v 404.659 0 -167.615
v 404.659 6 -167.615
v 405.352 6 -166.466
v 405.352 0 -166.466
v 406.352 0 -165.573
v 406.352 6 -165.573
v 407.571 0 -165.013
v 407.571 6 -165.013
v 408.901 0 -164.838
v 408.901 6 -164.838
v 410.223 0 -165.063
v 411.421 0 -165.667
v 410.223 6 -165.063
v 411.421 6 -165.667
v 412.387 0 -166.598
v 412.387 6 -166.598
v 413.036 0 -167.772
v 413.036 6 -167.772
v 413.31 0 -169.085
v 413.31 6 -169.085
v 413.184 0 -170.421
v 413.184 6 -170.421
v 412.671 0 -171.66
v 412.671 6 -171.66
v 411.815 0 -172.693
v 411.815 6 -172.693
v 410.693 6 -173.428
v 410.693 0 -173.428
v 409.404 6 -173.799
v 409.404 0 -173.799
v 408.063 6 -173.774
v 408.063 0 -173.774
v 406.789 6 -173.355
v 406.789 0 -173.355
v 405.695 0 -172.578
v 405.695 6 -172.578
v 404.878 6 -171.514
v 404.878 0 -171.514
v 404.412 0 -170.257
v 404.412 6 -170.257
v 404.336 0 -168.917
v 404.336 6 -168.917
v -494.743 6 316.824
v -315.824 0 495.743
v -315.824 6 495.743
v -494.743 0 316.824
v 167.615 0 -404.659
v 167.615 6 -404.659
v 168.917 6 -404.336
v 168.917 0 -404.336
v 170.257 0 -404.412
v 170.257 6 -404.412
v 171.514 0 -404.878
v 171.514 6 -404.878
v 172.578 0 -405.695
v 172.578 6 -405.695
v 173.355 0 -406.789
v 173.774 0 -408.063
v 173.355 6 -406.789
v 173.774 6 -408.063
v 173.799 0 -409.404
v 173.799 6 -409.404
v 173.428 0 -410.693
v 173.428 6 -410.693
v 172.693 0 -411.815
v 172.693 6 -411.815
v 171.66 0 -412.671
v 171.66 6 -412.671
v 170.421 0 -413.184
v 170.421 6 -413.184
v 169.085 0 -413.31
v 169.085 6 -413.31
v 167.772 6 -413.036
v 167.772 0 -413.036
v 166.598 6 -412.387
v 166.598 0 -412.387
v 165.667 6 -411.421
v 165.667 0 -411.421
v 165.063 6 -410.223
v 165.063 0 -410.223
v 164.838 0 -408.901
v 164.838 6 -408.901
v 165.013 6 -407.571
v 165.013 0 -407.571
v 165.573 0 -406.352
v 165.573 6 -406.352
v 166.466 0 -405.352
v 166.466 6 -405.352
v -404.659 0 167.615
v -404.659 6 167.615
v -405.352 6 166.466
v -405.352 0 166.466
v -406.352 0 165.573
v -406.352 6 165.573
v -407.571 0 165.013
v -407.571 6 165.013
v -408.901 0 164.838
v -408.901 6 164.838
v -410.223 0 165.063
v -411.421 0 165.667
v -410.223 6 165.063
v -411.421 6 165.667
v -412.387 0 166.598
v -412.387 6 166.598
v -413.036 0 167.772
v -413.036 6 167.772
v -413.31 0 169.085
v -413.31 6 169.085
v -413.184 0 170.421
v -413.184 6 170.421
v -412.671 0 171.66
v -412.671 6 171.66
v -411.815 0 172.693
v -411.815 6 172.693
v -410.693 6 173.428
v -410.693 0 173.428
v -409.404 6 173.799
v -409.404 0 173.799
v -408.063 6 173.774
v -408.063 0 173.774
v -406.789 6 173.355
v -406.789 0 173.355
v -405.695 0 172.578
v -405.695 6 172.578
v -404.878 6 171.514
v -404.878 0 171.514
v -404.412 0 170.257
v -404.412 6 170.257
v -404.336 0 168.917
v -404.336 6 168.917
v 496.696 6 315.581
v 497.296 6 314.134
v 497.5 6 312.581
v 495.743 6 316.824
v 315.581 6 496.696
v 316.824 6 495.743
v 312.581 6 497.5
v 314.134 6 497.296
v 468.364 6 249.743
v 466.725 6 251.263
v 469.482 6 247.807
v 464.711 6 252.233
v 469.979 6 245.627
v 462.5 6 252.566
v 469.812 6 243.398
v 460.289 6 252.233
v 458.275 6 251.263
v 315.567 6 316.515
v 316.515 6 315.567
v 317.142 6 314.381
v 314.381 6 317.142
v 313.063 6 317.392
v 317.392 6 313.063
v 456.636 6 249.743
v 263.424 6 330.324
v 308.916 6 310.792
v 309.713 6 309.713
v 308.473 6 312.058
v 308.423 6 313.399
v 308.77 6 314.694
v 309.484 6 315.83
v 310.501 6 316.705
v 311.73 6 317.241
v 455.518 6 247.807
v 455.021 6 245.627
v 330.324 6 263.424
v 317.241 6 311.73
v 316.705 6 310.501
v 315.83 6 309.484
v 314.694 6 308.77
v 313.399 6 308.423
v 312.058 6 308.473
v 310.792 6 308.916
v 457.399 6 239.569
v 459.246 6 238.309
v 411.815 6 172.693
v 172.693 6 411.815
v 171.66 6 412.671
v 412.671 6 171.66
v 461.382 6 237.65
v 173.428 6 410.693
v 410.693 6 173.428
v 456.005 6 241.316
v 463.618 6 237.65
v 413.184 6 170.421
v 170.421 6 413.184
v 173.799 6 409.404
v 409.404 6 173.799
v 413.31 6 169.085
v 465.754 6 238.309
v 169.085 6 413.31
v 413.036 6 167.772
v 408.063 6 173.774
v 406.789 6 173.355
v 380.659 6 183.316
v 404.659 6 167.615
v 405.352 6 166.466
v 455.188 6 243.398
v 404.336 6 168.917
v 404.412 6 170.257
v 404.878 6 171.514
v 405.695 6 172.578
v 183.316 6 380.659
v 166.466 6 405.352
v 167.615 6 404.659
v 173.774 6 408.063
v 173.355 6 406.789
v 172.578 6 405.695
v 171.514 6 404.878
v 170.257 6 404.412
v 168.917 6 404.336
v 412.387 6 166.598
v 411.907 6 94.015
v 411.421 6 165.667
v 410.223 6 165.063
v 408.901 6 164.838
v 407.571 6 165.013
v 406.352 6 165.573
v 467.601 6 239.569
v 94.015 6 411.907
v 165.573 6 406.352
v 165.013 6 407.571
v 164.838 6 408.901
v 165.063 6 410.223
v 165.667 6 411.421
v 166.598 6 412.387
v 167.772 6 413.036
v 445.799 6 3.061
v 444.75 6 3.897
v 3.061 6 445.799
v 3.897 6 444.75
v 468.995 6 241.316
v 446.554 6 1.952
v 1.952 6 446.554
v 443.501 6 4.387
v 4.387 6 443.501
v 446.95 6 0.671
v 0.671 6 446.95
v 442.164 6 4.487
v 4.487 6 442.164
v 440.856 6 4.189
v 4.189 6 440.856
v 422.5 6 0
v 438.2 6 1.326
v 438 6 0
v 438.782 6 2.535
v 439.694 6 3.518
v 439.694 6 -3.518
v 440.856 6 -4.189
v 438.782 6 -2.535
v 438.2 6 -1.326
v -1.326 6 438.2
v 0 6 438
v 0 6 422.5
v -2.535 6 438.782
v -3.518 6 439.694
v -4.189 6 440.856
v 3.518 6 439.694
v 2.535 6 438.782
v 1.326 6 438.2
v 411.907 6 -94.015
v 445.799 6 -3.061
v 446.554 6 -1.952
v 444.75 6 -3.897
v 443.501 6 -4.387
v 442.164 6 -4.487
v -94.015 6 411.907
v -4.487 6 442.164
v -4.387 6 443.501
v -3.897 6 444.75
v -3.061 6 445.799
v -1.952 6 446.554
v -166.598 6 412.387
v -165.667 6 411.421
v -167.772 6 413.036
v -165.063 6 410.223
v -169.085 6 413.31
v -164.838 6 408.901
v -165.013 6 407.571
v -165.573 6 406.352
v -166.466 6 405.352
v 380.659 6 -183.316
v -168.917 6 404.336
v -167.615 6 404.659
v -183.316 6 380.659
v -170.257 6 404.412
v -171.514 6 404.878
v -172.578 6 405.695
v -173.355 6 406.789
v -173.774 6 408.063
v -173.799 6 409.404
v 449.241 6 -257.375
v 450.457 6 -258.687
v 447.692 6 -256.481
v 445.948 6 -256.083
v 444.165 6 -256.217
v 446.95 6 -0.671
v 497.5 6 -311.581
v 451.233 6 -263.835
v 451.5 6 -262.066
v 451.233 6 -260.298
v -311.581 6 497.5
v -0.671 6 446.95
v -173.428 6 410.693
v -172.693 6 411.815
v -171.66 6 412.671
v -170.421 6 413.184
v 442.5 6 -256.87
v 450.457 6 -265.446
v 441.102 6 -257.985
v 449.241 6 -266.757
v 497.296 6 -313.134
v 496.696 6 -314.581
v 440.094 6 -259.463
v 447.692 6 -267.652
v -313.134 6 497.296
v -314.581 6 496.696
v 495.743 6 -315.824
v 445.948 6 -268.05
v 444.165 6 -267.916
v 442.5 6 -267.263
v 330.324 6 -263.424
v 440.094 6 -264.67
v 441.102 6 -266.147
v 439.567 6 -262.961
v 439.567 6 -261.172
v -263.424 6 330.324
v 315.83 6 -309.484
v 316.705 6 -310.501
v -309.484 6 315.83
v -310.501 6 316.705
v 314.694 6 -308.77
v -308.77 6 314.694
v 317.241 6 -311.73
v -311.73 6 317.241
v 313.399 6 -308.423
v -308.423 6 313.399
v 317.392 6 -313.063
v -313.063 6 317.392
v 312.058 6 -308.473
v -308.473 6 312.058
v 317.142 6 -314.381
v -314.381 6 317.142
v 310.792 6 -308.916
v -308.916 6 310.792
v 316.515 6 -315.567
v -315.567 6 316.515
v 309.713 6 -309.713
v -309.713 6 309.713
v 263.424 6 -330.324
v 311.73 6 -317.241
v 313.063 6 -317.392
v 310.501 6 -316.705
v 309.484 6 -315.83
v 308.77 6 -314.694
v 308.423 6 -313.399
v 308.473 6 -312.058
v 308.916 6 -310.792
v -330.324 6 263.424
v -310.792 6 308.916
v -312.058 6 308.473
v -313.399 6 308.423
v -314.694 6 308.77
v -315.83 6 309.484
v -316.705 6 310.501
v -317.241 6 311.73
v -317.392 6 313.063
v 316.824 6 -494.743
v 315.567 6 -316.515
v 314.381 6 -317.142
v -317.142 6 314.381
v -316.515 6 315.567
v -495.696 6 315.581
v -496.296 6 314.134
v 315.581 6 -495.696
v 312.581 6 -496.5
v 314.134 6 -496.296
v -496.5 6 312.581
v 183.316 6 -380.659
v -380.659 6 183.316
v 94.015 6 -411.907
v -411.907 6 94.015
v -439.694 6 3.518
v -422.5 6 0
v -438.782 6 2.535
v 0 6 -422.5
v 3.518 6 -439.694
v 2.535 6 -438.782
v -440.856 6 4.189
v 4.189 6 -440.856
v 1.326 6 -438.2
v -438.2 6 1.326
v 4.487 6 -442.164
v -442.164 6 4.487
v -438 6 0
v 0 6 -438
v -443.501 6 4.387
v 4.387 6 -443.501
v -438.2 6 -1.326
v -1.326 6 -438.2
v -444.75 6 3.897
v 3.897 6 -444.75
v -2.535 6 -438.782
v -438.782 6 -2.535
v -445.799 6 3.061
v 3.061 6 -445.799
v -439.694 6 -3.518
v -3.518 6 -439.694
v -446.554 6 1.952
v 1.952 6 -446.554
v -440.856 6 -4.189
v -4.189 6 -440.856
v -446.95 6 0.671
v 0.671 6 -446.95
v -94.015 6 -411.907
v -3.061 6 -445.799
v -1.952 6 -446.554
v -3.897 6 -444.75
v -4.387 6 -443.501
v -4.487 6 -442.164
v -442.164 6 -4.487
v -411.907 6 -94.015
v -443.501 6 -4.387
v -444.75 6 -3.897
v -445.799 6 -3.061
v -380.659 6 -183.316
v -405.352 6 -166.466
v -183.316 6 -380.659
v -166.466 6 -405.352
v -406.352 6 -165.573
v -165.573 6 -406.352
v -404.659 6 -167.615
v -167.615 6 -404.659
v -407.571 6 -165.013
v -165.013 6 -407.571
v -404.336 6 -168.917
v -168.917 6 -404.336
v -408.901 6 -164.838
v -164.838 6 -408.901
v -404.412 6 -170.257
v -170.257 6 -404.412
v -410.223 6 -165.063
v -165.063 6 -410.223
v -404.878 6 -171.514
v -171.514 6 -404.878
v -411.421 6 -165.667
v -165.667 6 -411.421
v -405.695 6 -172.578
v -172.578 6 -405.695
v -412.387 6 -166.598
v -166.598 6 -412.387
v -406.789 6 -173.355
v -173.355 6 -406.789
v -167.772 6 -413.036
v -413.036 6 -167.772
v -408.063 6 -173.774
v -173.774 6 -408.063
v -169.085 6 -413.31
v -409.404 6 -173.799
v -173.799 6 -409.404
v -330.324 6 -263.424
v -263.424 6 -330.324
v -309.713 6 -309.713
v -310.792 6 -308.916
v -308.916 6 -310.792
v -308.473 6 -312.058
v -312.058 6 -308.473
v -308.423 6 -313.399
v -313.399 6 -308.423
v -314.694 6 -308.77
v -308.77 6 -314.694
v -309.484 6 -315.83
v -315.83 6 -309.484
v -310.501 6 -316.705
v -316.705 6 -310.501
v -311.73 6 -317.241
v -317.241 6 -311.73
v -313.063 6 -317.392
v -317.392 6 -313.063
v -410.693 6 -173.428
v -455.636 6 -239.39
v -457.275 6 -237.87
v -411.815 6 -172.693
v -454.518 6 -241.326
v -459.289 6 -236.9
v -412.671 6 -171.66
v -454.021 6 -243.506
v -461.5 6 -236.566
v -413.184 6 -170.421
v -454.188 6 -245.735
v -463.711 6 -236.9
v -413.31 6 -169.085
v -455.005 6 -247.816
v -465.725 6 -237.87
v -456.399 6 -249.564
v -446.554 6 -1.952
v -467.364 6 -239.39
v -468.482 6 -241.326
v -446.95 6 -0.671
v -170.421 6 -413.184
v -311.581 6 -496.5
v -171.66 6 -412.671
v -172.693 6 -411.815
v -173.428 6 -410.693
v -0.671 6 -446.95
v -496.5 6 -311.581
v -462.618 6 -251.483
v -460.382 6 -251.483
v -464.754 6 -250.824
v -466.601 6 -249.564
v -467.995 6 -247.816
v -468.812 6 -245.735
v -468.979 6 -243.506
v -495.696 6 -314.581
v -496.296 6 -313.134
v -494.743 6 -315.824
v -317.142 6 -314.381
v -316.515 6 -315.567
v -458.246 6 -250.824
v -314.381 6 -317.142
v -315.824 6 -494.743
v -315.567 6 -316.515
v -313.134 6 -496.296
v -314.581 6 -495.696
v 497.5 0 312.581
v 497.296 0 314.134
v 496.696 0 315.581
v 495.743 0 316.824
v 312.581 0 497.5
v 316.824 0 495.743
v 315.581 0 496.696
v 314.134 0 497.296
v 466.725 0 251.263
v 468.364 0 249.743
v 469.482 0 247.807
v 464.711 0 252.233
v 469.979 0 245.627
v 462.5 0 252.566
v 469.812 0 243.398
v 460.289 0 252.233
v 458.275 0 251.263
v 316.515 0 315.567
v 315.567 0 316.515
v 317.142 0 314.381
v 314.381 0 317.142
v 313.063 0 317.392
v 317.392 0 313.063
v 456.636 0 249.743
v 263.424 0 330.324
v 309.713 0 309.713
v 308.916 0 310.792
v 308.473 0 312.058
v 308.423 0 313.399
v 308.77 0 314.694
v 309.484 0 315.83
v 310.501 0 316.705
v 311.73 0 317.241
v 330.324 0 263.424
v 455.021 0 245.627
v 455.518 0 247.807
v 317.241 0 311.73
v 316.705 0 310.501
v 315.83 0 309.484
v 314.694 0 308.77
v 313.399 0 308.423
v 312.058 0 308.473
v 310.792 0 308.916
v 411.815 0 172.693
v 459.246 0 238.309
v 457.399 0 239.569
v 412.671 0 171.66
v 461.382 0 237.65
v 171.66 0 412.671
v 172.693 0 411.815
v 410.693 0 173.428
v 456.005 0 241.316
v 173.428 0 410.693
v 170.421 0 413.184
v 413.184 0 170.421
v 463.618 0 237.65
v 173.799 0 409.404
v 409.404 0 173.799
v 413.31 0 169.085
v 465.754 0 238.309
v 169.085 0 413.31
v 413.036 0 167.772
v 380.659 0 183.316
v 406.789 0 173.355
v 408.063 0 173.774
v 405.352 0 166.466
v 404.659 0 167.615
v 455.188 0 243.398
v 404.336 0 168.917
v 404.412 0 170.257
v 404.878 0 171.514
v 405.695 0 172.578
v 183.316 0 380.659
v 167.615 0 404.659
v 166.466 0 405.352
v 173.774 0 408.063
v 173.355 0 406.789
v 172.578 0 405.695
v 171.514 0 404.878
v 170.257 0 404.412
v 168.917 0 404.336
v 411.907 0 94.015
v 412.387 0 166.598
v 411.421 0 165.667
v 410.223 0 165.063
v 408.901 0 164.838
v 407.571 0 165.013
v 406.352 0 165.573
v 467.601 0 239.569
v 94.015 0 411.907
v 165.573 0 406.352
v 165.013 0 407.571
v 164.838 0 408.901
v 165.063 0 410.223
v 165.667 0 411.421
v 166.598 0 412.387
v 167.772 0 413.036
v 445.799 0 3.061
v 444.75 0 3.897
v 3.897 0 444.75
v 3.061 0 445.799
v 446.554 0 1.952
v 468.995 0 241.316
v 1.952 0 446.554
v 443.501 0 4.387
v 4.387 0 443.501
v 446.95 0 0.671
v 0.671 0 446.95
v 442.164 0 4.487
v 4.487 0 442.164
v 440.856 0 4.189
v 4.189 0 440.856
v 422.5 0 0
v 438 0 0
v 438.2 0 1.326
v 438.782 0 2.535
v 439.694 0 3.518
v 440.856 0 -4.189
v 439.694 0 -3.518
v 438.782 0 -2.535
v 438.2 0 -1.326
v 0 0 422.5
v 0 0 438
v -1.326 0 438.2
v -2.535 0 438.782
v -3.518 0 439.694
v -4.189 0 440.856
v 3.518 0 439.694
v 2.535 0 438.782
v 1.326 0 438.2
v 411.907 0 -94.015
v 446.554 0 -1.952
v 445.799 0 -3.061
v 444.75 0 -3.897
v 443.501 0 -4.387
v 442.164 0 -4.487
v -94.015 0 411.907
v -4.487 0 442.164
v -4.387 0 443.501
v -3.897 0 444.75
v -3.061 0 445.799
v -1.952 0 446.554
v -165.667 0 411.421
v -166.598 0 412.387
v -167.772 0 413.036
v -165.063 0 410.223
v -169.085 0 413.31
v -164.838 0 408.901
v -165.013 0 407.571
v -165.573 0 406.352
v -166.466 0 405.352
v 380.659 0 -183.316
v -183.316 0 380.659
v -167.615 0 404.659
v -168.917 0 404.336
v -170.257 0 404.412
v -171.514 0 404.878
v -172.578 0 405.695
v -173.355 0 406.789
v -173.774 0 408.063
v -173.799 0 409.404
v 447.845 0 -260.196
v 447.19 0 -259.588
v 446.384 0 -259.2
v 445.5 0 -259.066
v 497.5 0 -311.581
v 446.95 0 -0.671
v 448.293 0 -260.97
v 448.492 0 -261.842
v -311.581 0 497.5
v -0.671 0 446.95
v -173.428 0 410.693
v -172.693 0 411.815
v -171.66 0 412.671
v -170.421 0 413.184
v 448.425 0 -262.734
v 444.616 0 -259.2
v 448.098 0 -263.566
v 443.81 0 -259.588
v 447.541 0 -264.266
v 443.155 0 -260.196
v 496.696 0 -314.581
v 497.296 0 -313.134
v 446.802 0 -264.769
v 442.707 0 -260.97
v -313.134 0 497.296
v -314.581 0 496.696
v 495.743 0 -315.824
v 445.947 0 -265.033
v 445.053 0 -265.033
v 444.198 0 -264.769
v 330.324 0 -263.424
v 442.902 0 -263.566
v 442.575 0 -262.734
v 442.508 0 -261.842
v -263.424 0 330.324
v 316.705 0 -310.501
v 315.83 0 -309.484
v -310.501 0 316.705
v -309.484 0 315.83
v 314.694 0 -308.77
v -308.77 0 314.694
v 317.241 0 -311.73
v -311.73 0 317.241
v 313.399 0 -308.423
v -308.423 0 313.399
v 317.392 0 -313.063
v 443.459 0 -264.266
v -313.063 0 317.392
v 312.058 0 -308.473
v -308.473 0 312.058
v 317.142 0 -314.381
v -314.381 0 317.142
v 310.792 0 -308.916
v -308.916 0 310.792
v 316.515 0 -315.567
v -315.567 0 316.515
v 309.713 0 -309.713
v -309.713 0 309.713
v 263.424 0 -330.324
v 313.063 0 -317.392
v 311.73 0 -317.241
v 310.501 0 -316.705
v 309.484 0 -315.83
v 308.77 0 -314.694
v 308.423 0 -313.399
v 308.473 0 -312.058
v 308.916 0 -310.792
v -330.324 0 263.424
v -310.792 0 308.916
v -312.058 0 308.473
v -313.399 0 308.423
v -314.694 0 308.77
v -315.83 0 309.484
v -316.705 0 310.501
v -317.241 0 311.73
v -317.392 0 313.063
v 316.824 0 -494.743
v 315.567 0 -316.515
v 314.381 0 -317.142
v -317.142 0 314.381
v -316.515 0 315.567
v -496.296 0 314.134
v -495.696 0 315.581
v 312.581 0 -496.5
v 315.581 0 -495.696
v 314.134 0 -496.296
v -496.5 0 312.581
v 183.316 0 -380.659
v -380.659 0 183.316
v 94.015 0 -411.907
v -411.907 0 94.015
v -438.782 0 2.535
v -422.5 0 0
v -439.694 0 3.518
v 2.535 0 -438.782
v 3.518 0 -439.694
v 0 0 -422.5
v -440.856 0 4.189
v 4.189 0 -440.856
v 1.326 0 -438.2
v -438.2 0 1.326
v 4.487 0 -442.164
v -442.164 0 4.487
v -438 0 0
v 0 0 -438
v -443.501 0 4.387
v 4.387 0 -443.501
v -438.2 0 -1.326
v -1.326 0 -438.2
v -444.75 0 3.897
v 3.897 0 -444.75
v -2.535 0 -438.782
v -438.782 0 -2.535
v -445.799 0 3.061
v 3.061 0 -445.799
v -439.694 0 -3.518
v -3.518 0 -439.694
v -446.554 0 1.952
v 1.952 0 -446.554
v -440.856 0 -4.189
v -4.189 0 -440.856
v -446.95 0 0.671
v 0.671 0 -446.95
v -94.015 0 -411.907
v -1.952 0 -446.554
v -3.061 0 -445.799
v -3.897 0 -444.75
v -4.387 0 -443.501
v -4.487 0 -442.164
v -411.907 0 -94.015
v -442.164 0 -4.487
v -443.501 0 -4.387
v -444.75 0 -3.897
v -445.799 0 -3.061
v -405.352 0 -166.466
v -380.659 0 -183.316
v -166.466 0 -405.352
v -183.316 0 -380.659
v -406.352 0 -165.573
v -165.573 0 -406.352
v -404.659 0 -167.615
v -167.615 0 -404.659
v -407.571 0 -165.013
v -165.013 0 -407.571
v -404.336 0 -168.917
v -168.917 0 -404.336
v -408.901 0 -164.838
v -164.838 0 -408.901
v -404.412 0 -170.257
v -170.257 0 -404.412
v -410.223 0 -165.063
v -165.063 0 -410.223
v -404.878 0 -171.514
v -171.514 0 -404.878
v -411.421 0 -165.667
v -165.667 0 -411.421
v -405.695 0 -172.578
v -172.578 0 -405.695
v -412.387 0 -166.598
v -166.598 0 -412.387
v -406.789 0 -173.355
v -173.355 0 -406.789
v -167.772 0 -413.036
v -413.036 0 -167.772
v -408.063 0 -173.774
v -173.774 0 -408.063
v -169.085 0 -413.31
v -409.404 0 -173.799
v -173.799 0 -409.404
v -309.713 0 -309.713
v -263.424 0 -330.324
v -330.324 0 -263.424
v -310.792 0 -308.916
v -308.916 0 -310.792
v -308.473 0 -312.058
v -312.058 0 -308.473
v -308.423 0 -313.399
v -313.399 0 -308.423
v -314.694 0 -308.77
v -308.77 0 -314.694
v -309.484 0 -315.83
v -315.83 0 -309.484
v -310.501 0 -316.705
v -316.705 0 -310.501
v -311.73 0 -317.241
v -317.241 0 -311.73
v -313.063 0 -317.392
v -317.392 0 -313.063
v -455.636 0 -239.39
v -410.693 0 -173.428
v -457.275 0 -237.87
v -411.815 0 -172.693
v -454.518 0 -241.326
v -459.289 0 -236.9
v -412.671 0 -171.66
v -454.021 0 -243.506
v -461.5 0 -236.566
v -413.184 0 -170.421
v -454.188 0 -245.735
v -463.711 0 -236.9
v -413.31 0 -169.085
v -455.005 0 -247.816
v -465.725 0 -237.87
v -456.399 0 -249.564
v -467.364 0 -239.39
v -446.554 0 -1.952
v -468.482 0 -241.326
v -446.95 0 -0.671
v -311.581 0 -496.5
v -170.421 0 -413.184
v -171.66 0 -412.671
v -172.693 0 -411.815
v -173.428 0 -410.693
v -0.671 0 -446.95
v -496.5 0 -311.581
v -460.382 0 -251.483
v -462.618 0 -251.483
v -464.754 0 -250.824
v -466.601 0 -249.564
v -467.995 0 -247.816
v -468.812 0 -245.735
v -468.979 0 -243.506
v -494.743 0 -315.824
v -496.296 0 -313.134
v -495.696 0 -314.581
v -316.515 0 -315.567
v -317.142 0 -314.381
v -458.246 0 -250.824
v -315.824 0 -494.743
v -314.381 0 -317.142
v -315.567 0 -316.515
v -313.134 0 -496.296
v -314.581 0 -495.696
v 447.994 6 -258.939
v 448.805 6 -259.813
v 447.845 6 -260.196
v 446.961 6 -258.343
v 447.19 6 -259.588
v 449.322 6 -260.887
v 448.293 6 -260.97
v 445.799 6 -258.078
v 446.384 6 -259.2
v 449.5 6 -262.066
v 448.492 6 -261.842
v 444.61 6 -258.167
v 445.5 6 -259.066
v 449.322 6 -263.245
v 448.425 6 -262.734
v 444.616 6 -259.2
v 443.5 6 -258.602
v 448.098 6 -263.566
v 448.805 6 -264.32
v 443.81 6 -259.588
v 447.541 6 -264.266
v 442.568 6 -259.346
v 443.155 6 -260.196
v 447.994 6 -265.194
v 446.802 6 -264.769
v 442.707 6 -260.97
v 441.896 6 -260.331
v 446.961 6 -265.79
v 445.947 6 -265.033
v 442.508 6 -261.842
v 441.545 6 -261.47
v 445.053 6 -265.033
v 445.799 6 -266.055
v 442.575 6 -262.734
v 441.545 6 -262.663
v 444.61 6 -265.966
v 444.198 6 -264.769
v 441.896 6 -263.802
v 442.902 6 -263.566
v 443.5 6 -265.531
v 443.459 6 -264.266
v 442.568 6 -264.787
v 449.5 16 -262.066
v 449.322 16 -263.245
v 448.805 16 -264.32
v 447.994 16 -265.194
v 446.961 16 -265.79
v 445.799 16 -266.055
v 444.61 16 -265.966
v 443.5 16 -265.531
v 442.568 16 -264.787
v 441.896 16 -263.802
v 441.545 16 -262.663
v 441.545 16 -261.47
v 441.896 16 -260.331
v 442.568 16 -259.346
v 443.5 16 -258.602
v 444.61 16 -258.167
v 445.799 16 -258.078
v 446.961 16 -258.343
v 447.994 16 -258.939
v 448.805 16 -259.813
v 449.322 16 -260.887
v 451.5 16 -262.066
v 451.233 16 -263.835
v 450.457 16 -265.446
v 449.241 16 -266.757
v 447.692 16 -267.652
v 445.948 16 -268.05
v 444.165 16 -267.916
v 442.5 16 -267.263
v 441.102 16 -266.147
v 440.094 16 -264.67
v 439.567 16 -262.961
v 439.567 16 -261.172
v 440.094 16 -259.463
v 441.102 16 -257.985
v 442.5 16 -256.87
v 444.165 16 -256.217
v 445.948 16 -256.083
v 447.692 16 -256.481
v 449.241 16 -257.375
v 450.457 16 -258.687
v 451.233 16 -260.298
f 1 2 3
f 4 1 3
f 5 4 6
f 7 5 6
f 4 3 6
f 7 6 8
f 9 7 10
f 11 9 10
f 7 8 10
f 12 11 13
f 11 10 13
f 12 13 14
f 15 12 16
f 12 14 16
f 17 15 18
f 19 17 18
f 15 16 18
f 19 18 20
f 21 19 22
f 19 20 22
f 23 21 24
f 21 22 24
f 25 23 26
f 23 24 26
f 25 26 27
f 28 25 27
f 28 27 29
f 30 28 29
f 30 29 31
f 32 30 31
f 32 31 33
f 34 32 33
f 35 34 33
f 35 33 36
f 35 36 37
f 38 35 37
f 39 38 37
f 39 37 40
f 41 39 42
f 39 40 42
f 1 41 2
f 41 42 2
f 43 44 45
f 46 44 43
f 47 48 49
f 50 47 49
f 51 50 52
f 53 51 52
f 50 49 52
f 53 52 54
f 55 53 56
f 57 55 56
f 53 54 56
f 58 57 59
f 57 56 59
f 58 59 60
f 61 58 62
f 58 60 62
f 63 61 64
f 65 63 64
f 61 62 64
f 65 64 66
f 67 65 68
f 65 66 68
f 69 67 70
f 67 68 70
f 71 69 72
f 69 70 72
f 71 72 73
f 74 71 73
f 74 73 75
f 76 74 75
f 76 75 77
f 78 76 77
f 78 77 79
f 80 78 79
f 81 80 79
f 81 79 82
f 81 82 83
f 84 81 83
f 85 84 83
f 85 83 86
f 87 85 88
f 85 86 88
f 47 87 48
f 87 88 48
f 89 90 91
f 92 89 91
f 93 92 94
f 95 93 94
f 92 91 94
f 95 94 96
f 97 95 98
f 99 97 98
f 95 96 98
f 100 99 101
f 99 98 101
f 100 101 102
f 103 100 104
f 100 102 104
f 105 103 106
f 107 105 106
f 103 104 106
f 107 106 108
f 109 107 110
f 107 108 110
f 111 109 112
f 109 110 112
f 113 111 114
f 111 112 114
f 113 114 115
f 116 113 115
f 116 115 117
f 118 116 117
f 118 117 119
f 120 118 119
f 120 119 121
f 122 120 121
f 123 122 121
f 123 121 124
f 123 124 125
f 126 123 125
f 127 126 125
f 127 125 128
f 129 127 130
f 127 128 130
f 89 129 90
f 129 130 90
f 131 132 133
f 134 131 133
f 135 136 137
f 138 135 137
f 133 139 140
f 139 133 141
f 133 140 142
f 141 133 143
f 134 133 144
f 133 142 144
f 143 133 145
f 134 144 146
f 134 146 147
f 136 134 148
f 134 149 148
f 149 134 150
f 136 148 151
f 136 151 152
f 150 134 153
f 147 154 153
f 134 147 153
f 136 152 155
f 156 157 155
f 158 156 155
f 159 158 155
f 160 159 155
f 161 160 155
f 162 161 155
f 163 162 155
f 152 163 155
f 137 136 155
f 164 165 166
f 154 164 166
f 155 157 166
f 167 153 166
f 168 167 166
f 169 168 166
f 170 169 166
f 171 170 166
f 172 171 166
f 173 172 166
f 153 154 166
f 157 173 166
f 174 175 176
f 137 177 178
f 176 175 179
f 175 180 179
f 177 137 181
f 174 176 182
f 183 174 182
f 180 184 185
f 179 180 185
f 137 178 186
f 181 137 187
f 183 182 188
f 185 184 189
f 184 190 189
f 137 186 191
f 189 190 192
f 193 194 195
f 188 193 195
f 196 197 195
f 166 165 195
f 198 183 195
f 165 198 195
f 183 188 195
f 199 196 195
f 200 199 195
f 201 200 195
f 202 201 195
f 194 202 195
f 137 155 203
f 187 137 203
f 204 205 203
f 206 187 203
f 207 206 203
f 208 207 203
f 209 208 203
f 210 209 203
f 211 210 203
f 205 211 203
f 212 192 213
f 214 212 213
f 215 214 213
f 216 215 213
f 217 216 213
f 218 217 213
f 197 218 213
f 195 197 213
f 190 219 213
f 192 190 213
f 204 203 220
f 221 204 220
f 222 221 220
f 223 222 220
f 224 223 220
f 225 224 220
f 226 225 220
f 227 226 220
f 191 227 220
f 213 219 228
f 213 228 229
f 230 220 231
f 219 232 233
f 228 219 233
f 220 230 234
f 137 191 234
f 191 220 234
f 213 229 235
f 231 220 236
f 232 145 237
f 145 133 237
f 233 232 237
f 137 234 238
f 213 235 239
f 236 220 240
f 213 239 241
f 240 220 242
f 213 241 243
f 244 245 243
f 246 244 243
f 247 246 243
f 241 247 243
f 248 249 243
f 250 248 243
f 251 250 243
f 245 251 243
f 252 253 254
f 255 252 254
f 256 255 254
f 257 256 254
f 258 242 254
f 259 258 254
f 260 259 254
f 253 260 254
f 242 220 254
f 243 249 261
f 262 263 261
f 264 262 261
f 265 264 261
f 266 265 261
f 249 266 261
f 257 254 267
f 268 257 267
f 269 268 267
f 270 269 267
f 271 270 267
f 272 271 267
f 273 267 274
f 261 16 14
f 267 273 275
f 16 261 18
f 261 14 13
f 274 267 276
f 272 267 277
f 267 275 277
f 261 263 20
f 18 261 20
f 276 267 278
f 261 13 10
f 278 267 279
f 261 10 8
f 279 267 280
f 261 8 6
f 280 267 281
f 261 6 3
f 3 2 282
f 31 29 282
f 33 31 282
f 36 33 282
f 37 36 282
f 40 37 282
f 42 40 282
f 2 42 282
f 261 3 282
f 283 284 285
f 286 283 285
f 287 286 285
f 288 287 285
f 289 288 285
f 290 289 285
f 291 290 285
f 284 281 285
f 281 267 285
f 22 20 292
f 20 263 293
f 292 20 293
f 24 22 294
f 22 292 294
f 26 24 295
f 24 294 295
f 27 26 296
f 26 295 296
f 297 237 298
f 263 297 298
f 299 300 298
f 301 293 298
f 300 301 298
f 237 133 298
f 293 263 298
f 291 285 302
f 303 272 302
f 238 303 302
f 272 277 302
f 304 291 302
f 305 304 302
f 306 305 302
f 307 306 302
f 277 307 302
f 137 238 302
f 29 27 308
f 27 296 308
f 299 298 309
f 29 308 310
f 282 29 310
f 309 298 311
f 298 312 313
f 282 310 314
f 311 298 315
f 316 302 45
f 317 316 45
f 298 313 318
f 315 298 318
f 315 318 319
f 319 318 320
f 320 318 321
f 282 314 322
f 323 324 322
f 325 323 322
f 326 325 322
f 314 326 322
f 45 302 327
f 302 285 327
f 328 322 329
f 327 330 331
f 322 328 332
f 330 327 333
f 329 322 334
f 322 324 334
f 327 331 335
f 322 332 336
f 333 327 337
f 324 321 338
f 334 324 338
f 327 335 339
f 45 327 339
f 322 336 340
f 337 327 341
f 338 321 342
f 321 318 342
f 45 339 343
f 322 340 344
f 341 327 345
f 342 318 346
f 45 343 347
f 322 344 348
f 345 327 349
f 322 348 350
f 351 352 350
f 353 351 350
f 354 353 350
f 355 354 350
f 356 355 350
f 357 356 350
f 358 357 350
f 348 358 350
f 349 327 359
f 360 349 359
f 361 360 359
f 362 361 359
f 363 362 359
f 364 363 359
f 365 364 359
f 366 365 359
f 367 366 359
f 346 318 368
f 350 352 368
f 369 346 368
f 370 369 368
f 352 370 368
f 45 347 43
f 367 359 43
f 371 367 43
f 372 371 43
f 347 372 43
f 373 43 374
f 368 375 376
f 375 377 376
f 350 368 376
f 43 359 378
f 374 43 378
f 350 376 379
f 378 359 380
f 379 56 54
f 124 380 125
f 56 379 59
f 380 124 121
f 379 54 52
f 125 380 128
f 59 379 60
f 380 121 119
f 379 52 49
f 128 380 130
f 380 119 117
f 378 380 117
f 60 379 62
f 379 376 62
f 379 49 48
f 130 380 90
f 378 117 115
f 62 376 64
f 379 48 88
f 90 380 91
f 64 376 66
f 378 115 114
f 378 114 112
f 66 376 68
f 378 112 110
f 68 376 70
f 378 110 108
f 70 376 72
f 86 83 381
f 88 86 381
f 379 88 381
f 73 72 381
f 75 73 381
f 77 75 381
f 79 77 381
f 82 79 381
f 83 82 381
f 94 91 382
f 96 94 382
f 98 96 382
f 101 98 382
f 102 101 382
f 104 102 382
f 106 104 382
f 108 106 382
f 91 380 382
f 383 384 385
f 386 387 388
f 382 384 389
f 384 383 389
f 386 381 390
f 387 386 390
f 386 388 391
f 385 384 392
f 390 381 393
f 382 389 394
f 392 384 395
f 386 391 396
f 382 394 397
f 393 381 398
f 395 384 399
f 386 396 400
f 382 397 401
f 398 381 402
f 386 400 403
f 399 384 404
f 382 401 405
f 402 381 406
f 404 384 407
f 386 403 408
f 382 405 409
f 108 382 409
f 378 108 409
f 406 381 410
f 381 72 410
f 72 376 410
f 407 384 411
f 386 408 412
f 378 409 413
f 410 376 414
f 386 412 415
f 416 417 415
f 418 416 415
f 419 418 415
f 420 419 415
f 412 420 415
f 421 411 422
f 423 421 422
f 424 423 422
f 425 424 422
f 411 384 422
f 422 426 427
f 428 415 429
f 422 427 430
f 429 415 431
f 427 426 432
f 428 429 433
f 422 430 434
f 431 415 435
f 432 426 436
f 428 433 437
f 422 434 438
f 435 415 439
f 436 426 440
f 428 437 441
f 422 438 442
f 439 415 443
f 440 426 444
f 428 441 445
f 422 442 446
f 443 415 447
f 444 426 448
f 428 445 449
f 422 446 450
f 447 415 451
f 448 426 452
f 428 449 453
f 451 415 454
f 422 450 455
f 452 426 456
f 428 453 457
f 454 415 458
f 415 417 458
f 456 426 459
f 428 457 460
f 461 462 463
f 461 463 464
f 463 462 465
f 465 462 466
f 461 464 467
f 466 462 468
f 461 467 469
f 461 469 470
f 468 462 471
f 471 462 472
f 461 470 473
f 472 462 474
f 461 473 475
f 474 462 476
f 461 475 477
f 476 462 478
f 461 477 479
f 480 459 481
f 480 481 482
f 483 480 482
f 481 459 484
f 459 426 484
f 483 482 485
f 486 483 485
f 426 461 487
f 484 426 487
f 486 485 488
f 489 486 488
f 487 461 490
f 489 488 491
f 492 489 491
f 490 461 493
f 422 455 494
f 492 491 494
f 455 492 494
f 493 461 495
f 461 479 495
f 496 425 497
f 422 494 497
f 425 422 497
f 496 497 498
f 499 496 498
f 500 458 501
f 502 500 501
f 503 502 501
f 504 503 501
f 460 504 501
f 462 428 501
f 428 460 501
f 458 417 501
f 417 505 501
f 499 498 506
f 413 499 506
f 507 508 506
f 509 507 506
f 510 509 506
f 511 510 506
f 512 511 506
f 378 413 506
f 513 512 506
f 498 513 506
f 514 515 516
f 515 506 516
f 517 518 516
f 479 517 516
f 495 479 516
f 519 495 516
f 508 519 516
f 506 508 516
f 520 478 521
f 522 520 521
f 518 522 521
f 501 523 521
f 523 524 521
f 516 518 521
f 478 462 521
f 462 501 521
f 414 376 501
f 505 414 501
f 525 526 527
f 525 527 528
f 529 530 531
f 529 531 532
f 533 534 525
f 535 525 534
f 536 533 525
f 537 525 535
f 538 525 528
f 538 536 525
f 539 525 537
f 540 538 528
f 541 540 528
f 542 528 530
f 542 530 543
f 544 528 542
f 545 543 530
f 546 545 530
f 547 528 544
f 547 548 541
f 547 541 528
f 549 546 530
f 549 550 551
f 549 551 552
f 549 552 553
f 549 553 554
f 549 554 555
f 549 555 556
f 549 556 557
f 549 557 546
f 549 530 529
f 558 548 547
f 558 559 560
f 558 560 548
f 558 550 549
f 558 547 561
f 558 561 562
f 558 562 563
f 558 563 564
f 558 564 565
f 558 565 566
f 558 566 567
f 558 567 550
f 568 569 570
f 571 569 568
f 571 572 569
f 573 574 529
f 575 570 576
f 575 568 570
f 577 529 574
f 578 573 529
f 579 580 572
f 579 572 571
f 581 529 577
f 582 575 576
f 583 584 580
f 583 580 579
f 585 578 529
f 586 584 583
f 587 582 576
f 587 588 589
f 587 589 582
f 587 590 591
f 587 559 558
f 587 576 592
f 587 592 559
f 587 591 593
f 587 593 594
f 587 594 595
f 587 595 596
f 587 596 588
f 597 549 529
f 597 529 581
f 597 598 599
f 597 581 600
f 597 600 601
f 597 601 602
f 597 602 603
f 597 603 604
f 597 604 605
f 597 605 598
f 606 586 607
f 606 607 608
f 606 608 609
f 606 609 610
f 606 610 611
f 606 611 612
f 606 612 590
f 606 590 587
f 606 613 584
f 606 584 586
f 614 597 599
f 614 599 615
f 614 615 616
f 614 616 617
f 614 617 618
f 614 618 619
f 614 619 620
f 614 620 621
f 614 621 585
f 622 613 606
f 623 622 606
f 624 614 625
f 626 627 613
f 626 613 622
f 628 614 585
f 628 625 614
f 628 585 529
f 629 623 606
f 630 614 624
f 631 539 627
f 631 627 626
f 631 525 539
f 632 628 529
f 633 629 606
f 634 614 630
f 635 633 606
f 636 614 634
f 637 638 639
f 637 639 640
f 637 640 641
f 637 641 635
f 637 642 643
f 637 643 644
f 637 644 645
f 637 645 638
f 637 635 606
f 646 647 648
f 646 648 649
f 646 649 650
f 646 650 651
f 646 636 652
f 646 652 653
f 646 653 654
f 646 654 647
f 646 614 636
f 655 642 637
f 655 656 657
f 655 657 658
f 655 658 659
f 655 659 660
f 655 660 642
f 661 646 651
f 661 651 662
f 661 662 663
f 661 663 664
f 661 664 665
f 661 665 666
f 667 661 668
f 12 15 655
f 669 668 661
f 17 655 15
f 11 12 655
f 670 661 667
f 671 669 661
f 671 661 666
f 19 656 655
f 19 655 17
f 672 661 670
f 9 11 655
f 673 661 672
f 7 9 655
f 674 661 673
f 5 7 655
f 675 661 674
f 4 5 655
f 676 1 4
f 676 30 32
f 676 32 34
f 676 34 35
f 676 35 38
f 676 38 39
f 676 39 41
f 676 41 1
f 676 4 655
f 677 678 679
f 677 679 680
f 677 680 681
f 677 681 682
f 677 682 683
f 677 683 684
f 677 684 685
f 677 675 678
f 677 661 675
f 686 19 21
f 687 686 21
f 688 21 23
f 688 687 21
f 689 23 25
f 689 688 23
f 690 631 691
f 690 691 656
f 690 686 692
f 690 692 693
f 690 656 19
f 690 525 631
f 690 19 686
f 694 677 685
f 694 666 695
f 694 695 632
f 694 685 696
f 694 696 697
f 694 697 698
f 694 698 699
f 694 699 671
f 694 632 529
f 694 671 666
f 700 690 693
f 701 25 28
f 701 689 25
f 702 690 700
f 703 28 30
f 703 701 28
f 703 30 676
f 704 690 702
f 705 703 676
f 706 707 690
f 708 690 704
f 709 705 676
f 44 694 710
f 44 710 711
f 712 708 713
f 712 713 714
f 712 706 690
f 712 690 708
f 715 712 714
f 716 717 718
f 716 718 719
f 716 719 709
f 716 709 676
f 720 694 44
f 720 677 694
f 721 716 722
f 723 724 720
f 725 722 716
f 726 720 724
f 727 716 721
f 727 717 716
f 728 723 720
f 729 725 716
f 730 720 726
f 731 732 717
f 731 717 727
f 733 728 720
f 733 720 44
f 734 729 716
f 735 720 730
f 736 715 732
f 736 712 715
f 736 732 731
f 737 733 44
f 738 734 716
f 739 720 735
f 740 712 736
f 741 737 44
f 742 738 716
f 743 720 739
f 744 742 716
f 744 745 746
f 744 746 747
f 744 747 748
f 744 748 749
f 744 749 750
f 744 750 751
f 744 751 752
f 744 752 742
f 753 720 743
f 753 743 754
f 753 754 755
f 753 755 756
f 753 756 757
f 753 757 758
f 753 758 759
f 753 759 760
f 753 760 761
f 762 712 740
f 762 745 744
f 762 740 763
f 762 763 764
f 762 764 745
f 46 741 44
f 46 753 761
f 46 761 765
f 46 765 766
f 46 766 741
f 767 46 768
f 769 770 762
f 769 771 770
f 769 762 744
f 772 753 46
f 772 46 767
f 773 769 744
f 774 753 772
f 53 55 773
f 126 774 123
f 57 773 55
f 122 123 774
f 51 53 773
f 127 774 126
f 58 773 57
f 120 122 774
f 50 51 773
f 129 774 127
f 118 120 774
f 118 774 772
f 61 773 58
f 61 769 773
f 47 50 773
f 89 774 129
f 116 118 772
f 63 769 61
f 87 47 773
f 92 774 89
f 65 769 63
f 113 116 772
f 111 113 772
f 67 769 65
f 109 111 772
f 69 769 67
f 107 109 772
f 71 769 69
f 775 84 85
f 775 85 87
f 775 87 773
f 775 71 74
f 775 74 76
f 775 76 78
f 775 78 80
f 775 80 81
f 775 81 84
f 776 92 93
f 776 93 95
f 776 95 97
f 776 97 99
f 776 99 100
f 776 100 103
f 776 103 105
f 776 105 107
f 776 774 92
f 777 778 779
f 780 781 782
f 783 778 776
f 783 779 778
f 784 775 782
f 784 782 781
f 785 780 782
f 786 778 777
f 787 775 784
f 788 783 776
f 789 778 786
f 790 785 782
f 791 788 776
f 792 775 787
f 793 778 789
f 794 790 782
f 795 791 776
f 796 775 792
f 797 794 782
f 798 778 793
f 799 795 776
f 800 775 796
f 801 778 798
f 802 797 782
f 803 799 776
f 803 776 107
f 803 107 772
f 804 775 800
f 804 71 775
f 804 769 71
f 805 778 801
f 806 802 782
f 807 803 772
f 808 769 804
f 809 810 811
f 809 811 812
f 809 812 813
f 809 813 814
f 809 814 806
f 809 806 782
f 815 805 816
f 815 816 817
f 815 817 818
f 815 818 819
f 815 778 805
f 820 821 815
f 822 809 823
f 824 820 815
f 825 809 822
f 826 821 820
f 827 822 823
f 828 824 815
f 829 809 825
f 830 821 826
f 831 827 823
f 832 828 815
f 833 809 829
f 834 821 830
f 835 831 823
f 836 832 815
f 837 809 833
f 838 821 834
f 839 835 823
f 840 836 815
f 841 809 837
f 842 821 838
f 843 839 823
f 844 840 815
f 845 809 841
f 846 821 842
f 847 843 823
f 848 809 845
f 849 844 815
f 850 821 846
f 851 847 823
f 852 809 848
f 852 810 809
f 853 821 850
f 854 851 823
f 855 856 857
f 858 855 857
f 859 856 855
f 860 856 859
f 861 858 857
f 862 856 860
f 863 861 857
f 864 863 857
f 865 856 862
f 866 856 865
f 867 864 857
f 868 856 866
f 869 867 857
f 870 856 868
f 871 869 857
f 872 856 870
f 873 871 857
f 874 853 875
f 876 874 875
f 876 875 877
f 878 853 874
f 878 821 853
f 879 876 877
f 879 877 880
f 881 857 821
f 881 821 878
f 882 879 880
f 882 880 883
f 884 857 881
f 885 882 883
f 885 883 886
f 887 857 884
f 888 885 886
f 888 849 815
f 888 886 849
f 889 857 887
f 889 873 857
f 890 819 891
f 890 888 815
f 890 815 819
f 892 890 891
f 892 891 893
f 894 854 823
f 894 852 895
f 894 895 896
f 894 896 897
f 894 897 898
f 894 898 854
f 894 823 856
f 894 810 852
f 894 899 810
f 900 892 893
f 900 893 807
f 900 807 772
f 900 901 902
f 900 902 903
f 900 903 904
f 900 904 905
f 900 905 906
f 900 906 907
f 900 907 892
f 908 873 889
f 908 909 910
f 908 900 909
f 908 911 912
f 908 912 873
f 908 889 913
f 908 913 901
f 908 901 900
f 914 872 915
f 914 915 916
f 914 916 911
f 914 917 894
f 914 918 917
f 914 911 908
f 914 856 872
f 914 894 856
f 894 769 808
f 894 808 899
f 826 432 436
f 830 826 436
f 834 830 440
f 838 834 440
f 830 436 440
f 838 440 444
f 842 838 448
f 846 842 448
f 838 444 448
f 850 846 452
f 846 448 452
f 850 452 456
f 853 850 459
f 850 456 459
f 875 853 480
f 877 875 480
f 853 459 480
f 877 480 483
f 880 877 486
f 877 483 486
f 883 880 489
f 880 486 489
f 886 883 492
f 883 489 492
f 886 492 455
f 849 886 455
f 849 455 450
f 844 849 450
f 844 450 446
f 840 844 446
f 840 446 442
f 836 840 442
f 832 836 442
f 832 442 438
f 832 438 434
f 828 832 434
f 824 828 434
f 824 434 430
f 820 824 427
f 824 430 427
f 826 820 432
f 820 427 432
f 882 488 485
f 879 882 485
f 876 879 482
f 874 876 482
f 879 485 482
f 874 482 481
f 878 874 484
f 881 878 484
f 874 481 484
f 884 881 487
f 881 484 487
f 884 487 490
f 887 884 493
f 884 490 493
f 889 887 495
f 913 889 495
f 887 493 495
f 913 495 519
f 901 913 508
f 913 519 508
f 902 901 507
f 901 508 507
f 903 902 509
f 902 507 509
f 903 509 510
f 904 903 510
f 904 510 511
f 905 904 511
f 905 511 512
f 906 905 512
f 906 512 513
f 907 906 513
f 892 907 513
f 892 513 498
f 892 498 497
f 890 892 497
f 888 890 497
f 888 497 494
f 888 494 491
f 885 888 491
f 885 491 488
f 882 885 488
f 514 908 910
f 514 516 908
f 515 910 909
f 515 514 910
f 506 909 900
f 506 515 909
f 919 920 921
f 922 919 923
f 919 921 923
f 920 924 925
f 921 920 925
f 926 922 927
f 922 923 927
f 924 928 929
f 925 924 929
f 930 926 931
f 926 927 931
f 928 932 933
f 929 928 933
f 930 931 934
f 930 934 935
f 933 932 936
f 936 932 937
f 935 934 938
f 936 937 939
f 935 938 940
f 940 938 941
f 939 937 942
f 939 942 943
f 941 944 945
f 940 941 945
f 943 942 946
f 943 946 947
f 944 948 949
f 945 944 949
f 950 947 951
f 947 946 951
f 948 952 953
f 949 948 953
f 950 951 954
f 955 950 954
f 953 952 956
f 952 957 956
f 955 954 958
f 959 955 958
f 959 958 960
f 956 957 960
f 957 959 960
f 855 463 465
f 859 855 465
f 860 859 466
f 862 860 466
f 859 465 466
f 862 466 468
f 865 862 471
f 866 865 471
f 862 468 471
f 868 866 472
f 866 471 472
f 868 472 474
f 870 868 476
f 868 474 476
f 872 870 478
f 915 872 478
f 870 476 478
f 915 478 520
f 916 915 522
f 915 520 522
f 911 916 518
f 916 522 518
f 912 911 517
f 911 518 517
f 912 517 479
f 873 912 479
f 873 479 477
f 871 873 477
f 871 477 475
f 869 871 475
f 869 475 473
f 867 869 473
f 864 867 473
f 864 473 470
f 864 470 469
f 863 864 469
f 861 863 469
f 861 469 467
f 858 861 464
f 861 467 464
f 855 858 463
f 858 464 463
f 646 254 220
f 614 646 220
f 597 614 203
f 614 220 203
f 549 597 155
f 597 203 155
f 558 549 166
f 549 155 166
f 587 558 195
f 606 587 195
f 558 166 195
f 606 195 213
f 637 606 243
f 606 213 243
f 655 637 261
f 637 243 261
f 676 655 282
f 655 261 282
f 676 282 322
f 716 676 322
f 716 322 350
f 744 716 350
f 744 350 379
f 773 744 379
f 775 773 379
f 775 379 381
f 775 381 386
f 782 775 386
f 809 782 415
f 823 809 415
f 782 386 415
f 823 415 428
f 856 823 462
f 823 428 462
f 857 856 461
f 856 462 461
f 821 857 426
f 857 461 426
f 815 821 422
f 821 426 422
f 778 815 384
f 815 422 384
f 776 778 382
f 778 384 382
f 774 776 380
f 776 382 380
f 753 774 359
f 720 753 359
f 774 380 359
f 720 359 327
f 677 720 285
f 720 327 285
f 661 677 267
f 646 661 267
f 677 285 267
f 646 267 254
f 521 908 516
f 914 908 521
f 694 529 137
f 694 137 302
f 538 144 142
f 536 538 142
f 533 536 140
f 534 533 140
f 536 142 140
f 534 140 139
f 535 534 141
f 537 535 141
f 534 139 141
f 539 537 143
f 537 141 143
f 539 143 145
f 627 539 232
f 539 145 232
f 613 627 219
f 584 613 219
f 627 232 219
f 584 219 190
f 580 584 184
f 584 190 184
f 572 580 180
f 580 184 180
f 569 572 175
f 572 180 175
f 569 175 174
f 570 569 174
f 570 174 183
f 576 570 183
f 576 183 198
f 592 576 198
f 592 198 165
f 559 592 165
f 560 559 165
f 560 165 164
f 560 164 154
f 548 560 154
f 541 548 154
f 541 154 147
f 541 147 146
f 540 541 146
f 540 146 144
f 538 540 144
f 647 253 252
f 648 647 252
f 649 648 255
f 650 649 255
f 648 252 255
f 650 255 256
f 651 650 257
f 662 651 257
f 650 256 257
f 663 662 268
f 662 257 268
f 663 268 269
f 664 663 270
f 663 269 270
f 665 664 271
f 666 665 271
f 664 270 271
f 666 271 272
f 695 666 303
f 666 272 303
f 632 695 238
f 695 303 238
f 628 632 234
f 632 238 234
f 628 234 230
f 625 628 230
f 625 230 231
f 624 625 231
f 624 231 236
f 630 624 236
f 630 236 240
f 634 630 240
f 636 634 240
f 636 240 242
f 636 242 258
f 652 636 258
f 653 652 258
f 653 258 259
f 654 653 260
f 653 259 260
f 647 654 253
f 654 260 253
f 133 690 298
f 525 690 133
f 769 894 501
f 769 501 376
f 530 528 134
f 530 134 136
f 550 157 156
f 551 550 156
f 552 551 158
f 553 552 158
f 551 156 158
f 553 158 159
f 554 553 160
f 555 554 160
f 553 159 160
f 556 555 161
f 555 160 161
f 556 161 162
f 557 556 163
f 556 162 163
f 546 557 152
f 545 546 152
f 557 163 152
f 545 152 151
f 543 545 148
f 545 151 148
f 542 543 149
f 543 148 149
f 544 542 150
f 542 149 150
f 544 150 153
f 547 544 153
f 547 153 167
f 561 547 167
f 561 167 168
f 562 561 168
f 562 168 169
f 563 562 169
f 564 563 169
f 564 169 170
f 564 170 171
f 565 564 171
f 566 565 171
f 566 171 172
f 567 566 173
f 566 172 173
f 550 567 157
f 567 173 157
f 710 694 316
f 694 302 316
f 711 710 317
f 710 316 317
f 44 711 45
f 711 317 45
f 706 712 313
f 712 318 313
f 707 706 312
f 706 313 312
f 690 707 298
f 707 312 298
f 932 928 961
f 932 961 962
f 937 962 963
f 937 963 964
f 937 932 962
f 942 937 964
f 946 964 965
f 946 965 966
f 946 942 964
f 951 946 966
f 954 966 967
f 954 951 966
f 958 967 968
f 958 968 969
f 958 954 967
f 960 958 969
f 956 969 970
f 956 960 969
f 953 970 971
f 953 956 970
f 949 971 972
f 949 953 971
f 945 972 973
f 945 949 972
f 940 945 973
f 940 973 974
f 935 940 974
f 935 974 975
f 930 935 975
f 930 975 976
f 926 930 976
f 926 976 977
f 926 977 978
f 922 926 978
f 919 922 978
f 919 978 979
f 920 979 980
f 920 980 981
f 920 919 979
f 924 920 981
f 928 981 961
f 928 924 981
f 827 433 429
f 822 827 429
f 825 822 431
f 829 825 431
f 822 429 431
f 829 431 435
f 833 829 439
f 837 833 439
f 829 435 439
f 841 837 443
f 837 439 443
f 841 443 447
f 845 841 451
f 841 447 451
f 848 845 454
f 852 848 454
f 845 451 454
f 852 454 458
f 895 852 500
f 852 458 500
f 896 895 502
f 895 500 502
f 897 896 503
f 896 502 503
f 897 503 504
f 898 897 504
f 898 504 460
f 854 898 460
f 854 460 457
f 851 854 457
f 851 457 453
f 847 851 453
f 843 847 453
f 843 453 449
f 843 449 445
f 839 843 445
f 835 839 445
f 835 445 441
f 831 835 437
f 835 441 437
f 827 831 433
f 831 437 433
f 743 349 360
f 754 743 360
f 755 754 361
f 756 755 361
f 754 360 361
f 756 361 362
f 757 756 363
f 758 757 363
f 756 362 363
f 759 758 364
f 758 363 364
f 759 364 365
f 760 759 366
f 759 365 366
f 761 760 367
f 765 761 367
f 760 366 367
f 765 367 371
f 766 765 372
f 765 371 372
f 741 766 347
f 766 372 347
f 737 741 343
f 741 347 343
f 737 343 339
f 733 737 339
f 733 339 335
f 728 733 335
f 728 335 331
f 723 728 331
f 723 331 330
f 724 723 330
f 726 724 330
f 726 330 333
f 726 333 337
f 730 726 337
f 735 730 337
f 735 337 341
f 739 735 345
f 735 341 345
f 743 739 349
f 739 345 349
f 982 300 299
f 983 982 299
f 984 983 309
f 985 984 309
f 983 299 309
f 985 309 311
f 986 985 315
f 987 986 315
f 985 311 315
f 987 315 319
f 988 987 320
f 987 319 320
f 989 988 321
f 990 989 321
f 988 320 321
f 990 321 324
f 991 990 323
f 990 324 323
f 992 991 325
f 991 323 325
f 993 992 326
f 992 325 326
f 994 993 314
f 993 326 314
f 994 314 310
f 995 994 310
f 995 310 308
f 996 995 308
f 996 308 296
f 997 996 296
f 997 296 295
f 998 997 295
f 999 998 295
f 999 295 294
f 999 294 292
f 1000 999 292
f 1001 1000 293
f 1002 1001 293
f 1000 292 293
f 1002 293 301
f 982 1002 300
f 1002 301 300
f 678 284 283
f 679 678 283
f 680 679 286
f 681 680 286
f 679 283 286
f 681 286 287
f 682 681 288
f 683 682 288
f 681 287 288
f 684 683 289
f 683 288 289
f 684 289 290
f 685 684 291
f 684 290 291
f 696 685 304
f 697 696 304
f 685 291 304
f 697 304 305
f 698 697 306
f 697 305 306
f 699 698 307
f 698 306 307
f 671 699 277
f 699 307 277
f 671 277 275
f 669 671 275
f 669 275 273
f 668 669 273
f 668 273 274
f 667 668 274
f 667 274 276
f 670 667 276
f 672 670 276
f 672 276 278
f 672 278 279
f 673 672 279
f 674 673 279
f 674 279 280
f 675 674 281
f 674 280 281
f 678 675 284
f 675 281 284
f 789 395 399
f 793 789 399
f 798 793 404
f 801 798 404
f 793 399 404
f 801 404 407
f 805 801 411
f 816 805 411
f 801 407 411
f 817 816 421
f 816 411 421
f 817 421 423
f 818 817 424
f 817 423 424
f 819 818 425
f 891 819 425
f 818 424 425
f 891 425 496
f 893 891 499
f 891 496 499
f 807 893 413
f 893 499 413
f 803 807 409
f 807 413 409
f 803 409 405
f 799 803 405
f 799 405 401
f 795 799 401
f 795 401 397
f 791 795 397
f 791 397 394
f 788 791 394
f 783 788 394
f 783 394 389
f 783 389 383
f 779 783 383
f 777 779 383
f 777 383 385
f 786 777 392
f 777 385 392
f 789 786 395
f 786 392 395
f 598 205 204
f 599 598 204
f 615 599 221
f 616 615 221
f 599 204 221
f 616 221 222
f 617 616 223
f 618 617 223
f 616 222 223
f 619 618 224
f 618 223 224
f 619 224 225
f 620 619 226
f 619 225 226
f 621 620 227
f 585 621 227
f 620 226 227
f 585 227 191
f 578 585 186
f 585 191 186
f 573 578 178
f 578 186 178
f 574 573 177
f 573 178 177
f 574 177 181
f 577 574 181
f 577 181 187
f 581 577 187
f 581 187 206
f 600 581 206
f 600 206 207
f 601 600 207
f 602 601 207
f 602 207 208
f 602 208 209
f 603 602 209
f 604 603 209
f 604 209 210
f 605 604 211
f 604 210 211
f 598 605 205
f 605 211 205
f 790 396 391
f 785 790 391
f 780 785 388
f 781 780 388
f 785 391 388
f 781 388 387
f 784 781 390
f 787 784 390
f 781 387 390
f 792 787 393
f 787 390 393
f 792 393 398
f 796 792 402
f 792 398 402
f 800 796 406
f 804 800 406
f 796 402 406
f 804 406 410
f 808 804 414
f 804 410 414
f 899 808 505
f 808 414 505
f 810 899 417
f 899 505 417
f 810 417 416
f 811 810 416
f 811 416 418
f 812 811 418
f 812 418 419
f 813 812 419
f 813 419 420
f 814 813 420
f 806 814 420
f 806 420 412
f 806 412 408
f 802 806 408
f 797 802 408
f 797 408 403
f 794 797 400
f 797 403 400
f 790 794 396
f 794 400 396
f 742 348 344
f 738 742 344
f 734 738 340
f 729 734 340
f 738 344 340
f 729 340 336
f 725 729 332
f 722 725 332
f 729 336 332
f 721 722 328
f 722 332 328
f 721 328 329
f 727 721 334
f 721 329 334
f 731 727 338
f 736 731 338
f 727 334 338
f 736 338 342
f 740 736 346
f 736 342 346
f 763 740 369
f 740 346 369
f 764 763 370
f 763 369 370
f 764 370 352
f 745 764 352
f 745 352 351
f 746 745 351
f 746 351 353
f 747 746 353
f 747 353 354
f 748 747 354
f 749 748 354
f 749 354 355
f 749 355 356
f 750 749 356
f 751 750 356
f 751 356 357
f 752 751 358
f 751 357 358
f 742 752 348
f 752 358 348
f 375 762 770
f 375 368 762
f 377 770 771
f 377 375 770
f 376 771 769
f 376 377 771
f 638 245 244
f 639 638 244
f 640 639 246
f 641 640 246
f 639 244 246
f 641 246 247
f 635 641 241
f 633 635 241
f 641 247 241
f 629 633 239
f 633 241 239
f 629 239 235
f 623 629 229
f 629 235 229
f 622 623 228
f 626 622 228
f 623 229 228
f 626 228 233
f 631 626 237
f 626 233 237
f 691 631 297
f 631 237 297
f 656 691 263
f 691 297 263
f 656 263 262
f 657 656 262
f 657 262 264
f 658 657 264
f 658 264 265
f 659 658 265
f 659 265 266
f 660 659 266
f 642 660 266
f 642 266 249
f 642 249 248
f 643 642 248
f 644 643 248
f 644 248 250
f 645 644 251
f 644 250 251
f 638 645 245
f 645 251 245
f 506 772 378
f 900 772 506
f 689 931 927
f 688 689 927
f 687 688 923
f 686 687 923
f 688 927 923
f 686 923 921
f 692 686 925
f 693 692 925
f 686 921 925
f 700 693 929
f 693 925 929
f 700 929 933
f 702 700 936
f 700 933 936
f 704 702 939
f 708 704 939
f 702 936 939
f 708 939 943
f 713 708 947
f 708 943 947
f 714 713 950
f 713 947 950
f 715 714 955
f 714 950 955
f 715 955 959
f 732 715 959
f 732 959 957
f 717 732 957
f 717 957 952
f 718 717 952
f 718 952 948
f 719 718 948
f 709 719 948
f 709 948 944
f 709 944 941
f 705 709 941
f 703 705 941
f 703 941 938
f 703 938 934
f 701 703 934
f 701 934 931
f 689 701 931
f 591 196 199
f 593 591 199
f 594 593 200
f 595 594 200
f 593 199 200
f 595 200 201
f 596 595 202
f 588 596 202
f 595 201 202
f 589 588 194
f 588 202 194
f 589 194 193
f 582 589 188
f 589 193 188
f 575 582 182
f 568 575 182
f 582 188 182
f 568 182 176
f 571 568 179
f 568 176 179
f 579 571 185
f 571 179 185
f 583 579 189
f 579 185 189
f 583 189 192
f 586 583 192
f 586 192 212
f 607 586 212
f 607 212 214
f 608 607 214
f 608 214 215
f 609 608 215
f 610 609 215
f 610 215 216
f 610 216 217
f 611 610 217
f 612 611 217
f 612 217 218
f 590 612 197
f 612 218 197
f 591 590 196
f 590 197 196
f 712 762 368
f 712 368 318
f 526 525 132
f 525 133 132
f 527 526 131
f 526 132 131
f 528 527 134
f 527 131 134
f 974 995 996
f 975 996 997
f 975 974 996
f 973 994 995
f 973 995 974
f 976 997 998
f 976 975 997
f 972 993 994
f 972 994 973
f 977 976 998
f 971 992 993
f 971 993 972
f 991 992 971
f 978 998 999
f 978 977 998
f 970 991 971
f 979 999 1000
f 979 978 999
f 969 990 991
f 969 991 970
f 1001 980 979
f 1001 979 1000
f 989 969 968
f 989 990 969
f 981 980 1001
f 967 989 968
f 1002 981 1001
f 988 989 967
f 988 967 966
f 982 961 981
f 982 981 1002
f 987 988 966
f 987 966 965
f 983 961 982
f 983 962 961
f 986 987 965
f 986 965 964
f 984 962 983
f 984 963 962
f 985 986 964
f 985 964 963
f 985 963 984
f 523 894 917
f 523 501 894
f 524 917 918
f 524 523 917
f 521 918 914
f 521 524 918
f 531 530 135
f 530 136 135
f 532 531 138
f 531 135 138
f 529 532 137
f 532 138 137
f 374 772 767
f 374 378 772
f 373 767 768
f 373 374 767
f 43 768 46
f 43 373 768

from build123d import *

# Parameters (mm, degrees)
BOSS_EXTRUDE1_DEPTH = 6
SKETCH2_R           = 422.5
CUT_EXTRUDE1_DEPTH  = 6
SKETCH3_R           = 4.5
CUT_EXTRUDE2_DEPTH  = 6
CIRPATTERN1_COUNT   = 16
SKETCH4_R           = 3
CUT_EXTRUDE3_DEPTH  = 10
SKETCH5_R           = 7.5
CUT_EXTRUDE4_DEPTH  = 10
FILLET1_R           = 6
SKETCH6_R           = 6
SKETCH6_R_2         = 4
EXTRUDE_THIN1_DEPTH = 10


with BuildPart() as part:
    # Sketch1 → Boss-Extrude1 (new body)
    with BuildSketch(Plane(origin=(0, 0, 0), x_dir=(1, 0, 0), z_dir=(0, 1, 0))):
        Polygon((315.066450454, 496.5), (497.5, 314.066450454), (497.5, -315.066450454), (315.066450454, -497.5), (-314.066450454, -497.5), (-496.5, -315.066450454), (-496.5, 314.066450454), (-314.066450454, 496.5), align=None)
    extrude(amount=BOSS_EXTRUDE1_DEPTH)

    # Sketch2 → Cut-Extrude1 (cut)
    with BuildSketch(Plane(origin=(0, 6, 0), x_dir=(1, 0, 0), z_dir=(0, 1, 0))):
        with Locations(Location((0, 0, 0), (0, 0, 270))):
            Circle(SKETCH2_R)
    extrude(amount=-CUT_EXTRUDE1_DEPTH, mode=Mode.SUBTRACT)

    # Sketch3 → Cut-Extrude2 (cut)
    with BuildSketch(Plane(origin=(0, 6, 0), x_dir=(1, 0, 0), z_dir=(0, 1, 0))):
        with Locations(Location((0, 442.5, 0), (0, 0, 270))):
            Circle(SKETCH3_R)
    cut_extrude2 = extrude(amount=-CUT_EXTRUDE2_DEPTH, mode=Mode.SUBTRACT)

    # CirPattern1: Cut-Extrude2 ×16 about axis
    cirpattern1_axis = Axis((0, 0, 0), (0, 1, 0))
    for i in range(1, CIRPATTERN1_COUNT):
        add(cut_extrude2.rotate(cirpattern1_axis, i * 360 / CIRPATTERN1_COUNT), mode=Mode.SUBTRACT)

    # Sketch4 → Cut-Extrude3 (cut)
    with BuildSketch(Plane(origin=(0, 6, 0), x_dir=(1, 0, 0), z_dir=(0, 1, 0))):
        with Locations(Location((445.5, 262.066450454, 0), (0, 0, 270))):
            Circle(SKETCH4_R)
    extrude(amount=-CUT_EXTRUDE3_DEPTH, mode=Mode.SUBTRACT)

    # Sketch5 → Cut-Extrude4 (cut)
    with BuildSketch(Plane(origin=(0, 6, 0), x_dir=(1, 0, 0), z_dir=(0, 1, 0))):
        with Locations(Location((-461.5, 244.066450454, 0), (0, 0, 270))):
            Circle(SKETCH5_R)
        with Locations(Location((462.5, -245.066450454, 0), (0, 0, 270))):
            Circle(SKETCH5_R)
    extrude(amount=-CUT_EXTRUDE4_DEPTH, mode=Mode.SUBTRACT)

    # Fillet1
    fillet1_edges = [part.edges().sort_by_distance(p)[0] for p in [
        (315.066450454, 3, -496.5),
        (497.5, 3, -314.066450454),
        (497.5, 3, 315.066450454),
        (315.066450454, 3, 497.5),
        (-314.066450454, 3, 497.5),
        (-496.5, 3, 315.066450454),
        (-496.5, 3, -314.066450454),
        (-314.066450454, 3, -496.5),
    ]]
    fillet(fillet1_edges, radius=FILLET1_R)

    # Sketch6 → Extrude-Thin1 (add)
    with BuildSketch(Plane(origin=(0, 6, 0), x_dir=(1, 0, 0), z_dir=(0, 1, 0))):
        with Locations((445.5, 262.066450454)):
            Circle(SKETCH6_R)
        with Locations((445.5, 262.066450454)):
            Circle(SKETCH6_R_2, mode=Mode.SUBTRACT)
    extrude(amount=EXTRUDE_THIN1_DEPTH)


solid = part.part
